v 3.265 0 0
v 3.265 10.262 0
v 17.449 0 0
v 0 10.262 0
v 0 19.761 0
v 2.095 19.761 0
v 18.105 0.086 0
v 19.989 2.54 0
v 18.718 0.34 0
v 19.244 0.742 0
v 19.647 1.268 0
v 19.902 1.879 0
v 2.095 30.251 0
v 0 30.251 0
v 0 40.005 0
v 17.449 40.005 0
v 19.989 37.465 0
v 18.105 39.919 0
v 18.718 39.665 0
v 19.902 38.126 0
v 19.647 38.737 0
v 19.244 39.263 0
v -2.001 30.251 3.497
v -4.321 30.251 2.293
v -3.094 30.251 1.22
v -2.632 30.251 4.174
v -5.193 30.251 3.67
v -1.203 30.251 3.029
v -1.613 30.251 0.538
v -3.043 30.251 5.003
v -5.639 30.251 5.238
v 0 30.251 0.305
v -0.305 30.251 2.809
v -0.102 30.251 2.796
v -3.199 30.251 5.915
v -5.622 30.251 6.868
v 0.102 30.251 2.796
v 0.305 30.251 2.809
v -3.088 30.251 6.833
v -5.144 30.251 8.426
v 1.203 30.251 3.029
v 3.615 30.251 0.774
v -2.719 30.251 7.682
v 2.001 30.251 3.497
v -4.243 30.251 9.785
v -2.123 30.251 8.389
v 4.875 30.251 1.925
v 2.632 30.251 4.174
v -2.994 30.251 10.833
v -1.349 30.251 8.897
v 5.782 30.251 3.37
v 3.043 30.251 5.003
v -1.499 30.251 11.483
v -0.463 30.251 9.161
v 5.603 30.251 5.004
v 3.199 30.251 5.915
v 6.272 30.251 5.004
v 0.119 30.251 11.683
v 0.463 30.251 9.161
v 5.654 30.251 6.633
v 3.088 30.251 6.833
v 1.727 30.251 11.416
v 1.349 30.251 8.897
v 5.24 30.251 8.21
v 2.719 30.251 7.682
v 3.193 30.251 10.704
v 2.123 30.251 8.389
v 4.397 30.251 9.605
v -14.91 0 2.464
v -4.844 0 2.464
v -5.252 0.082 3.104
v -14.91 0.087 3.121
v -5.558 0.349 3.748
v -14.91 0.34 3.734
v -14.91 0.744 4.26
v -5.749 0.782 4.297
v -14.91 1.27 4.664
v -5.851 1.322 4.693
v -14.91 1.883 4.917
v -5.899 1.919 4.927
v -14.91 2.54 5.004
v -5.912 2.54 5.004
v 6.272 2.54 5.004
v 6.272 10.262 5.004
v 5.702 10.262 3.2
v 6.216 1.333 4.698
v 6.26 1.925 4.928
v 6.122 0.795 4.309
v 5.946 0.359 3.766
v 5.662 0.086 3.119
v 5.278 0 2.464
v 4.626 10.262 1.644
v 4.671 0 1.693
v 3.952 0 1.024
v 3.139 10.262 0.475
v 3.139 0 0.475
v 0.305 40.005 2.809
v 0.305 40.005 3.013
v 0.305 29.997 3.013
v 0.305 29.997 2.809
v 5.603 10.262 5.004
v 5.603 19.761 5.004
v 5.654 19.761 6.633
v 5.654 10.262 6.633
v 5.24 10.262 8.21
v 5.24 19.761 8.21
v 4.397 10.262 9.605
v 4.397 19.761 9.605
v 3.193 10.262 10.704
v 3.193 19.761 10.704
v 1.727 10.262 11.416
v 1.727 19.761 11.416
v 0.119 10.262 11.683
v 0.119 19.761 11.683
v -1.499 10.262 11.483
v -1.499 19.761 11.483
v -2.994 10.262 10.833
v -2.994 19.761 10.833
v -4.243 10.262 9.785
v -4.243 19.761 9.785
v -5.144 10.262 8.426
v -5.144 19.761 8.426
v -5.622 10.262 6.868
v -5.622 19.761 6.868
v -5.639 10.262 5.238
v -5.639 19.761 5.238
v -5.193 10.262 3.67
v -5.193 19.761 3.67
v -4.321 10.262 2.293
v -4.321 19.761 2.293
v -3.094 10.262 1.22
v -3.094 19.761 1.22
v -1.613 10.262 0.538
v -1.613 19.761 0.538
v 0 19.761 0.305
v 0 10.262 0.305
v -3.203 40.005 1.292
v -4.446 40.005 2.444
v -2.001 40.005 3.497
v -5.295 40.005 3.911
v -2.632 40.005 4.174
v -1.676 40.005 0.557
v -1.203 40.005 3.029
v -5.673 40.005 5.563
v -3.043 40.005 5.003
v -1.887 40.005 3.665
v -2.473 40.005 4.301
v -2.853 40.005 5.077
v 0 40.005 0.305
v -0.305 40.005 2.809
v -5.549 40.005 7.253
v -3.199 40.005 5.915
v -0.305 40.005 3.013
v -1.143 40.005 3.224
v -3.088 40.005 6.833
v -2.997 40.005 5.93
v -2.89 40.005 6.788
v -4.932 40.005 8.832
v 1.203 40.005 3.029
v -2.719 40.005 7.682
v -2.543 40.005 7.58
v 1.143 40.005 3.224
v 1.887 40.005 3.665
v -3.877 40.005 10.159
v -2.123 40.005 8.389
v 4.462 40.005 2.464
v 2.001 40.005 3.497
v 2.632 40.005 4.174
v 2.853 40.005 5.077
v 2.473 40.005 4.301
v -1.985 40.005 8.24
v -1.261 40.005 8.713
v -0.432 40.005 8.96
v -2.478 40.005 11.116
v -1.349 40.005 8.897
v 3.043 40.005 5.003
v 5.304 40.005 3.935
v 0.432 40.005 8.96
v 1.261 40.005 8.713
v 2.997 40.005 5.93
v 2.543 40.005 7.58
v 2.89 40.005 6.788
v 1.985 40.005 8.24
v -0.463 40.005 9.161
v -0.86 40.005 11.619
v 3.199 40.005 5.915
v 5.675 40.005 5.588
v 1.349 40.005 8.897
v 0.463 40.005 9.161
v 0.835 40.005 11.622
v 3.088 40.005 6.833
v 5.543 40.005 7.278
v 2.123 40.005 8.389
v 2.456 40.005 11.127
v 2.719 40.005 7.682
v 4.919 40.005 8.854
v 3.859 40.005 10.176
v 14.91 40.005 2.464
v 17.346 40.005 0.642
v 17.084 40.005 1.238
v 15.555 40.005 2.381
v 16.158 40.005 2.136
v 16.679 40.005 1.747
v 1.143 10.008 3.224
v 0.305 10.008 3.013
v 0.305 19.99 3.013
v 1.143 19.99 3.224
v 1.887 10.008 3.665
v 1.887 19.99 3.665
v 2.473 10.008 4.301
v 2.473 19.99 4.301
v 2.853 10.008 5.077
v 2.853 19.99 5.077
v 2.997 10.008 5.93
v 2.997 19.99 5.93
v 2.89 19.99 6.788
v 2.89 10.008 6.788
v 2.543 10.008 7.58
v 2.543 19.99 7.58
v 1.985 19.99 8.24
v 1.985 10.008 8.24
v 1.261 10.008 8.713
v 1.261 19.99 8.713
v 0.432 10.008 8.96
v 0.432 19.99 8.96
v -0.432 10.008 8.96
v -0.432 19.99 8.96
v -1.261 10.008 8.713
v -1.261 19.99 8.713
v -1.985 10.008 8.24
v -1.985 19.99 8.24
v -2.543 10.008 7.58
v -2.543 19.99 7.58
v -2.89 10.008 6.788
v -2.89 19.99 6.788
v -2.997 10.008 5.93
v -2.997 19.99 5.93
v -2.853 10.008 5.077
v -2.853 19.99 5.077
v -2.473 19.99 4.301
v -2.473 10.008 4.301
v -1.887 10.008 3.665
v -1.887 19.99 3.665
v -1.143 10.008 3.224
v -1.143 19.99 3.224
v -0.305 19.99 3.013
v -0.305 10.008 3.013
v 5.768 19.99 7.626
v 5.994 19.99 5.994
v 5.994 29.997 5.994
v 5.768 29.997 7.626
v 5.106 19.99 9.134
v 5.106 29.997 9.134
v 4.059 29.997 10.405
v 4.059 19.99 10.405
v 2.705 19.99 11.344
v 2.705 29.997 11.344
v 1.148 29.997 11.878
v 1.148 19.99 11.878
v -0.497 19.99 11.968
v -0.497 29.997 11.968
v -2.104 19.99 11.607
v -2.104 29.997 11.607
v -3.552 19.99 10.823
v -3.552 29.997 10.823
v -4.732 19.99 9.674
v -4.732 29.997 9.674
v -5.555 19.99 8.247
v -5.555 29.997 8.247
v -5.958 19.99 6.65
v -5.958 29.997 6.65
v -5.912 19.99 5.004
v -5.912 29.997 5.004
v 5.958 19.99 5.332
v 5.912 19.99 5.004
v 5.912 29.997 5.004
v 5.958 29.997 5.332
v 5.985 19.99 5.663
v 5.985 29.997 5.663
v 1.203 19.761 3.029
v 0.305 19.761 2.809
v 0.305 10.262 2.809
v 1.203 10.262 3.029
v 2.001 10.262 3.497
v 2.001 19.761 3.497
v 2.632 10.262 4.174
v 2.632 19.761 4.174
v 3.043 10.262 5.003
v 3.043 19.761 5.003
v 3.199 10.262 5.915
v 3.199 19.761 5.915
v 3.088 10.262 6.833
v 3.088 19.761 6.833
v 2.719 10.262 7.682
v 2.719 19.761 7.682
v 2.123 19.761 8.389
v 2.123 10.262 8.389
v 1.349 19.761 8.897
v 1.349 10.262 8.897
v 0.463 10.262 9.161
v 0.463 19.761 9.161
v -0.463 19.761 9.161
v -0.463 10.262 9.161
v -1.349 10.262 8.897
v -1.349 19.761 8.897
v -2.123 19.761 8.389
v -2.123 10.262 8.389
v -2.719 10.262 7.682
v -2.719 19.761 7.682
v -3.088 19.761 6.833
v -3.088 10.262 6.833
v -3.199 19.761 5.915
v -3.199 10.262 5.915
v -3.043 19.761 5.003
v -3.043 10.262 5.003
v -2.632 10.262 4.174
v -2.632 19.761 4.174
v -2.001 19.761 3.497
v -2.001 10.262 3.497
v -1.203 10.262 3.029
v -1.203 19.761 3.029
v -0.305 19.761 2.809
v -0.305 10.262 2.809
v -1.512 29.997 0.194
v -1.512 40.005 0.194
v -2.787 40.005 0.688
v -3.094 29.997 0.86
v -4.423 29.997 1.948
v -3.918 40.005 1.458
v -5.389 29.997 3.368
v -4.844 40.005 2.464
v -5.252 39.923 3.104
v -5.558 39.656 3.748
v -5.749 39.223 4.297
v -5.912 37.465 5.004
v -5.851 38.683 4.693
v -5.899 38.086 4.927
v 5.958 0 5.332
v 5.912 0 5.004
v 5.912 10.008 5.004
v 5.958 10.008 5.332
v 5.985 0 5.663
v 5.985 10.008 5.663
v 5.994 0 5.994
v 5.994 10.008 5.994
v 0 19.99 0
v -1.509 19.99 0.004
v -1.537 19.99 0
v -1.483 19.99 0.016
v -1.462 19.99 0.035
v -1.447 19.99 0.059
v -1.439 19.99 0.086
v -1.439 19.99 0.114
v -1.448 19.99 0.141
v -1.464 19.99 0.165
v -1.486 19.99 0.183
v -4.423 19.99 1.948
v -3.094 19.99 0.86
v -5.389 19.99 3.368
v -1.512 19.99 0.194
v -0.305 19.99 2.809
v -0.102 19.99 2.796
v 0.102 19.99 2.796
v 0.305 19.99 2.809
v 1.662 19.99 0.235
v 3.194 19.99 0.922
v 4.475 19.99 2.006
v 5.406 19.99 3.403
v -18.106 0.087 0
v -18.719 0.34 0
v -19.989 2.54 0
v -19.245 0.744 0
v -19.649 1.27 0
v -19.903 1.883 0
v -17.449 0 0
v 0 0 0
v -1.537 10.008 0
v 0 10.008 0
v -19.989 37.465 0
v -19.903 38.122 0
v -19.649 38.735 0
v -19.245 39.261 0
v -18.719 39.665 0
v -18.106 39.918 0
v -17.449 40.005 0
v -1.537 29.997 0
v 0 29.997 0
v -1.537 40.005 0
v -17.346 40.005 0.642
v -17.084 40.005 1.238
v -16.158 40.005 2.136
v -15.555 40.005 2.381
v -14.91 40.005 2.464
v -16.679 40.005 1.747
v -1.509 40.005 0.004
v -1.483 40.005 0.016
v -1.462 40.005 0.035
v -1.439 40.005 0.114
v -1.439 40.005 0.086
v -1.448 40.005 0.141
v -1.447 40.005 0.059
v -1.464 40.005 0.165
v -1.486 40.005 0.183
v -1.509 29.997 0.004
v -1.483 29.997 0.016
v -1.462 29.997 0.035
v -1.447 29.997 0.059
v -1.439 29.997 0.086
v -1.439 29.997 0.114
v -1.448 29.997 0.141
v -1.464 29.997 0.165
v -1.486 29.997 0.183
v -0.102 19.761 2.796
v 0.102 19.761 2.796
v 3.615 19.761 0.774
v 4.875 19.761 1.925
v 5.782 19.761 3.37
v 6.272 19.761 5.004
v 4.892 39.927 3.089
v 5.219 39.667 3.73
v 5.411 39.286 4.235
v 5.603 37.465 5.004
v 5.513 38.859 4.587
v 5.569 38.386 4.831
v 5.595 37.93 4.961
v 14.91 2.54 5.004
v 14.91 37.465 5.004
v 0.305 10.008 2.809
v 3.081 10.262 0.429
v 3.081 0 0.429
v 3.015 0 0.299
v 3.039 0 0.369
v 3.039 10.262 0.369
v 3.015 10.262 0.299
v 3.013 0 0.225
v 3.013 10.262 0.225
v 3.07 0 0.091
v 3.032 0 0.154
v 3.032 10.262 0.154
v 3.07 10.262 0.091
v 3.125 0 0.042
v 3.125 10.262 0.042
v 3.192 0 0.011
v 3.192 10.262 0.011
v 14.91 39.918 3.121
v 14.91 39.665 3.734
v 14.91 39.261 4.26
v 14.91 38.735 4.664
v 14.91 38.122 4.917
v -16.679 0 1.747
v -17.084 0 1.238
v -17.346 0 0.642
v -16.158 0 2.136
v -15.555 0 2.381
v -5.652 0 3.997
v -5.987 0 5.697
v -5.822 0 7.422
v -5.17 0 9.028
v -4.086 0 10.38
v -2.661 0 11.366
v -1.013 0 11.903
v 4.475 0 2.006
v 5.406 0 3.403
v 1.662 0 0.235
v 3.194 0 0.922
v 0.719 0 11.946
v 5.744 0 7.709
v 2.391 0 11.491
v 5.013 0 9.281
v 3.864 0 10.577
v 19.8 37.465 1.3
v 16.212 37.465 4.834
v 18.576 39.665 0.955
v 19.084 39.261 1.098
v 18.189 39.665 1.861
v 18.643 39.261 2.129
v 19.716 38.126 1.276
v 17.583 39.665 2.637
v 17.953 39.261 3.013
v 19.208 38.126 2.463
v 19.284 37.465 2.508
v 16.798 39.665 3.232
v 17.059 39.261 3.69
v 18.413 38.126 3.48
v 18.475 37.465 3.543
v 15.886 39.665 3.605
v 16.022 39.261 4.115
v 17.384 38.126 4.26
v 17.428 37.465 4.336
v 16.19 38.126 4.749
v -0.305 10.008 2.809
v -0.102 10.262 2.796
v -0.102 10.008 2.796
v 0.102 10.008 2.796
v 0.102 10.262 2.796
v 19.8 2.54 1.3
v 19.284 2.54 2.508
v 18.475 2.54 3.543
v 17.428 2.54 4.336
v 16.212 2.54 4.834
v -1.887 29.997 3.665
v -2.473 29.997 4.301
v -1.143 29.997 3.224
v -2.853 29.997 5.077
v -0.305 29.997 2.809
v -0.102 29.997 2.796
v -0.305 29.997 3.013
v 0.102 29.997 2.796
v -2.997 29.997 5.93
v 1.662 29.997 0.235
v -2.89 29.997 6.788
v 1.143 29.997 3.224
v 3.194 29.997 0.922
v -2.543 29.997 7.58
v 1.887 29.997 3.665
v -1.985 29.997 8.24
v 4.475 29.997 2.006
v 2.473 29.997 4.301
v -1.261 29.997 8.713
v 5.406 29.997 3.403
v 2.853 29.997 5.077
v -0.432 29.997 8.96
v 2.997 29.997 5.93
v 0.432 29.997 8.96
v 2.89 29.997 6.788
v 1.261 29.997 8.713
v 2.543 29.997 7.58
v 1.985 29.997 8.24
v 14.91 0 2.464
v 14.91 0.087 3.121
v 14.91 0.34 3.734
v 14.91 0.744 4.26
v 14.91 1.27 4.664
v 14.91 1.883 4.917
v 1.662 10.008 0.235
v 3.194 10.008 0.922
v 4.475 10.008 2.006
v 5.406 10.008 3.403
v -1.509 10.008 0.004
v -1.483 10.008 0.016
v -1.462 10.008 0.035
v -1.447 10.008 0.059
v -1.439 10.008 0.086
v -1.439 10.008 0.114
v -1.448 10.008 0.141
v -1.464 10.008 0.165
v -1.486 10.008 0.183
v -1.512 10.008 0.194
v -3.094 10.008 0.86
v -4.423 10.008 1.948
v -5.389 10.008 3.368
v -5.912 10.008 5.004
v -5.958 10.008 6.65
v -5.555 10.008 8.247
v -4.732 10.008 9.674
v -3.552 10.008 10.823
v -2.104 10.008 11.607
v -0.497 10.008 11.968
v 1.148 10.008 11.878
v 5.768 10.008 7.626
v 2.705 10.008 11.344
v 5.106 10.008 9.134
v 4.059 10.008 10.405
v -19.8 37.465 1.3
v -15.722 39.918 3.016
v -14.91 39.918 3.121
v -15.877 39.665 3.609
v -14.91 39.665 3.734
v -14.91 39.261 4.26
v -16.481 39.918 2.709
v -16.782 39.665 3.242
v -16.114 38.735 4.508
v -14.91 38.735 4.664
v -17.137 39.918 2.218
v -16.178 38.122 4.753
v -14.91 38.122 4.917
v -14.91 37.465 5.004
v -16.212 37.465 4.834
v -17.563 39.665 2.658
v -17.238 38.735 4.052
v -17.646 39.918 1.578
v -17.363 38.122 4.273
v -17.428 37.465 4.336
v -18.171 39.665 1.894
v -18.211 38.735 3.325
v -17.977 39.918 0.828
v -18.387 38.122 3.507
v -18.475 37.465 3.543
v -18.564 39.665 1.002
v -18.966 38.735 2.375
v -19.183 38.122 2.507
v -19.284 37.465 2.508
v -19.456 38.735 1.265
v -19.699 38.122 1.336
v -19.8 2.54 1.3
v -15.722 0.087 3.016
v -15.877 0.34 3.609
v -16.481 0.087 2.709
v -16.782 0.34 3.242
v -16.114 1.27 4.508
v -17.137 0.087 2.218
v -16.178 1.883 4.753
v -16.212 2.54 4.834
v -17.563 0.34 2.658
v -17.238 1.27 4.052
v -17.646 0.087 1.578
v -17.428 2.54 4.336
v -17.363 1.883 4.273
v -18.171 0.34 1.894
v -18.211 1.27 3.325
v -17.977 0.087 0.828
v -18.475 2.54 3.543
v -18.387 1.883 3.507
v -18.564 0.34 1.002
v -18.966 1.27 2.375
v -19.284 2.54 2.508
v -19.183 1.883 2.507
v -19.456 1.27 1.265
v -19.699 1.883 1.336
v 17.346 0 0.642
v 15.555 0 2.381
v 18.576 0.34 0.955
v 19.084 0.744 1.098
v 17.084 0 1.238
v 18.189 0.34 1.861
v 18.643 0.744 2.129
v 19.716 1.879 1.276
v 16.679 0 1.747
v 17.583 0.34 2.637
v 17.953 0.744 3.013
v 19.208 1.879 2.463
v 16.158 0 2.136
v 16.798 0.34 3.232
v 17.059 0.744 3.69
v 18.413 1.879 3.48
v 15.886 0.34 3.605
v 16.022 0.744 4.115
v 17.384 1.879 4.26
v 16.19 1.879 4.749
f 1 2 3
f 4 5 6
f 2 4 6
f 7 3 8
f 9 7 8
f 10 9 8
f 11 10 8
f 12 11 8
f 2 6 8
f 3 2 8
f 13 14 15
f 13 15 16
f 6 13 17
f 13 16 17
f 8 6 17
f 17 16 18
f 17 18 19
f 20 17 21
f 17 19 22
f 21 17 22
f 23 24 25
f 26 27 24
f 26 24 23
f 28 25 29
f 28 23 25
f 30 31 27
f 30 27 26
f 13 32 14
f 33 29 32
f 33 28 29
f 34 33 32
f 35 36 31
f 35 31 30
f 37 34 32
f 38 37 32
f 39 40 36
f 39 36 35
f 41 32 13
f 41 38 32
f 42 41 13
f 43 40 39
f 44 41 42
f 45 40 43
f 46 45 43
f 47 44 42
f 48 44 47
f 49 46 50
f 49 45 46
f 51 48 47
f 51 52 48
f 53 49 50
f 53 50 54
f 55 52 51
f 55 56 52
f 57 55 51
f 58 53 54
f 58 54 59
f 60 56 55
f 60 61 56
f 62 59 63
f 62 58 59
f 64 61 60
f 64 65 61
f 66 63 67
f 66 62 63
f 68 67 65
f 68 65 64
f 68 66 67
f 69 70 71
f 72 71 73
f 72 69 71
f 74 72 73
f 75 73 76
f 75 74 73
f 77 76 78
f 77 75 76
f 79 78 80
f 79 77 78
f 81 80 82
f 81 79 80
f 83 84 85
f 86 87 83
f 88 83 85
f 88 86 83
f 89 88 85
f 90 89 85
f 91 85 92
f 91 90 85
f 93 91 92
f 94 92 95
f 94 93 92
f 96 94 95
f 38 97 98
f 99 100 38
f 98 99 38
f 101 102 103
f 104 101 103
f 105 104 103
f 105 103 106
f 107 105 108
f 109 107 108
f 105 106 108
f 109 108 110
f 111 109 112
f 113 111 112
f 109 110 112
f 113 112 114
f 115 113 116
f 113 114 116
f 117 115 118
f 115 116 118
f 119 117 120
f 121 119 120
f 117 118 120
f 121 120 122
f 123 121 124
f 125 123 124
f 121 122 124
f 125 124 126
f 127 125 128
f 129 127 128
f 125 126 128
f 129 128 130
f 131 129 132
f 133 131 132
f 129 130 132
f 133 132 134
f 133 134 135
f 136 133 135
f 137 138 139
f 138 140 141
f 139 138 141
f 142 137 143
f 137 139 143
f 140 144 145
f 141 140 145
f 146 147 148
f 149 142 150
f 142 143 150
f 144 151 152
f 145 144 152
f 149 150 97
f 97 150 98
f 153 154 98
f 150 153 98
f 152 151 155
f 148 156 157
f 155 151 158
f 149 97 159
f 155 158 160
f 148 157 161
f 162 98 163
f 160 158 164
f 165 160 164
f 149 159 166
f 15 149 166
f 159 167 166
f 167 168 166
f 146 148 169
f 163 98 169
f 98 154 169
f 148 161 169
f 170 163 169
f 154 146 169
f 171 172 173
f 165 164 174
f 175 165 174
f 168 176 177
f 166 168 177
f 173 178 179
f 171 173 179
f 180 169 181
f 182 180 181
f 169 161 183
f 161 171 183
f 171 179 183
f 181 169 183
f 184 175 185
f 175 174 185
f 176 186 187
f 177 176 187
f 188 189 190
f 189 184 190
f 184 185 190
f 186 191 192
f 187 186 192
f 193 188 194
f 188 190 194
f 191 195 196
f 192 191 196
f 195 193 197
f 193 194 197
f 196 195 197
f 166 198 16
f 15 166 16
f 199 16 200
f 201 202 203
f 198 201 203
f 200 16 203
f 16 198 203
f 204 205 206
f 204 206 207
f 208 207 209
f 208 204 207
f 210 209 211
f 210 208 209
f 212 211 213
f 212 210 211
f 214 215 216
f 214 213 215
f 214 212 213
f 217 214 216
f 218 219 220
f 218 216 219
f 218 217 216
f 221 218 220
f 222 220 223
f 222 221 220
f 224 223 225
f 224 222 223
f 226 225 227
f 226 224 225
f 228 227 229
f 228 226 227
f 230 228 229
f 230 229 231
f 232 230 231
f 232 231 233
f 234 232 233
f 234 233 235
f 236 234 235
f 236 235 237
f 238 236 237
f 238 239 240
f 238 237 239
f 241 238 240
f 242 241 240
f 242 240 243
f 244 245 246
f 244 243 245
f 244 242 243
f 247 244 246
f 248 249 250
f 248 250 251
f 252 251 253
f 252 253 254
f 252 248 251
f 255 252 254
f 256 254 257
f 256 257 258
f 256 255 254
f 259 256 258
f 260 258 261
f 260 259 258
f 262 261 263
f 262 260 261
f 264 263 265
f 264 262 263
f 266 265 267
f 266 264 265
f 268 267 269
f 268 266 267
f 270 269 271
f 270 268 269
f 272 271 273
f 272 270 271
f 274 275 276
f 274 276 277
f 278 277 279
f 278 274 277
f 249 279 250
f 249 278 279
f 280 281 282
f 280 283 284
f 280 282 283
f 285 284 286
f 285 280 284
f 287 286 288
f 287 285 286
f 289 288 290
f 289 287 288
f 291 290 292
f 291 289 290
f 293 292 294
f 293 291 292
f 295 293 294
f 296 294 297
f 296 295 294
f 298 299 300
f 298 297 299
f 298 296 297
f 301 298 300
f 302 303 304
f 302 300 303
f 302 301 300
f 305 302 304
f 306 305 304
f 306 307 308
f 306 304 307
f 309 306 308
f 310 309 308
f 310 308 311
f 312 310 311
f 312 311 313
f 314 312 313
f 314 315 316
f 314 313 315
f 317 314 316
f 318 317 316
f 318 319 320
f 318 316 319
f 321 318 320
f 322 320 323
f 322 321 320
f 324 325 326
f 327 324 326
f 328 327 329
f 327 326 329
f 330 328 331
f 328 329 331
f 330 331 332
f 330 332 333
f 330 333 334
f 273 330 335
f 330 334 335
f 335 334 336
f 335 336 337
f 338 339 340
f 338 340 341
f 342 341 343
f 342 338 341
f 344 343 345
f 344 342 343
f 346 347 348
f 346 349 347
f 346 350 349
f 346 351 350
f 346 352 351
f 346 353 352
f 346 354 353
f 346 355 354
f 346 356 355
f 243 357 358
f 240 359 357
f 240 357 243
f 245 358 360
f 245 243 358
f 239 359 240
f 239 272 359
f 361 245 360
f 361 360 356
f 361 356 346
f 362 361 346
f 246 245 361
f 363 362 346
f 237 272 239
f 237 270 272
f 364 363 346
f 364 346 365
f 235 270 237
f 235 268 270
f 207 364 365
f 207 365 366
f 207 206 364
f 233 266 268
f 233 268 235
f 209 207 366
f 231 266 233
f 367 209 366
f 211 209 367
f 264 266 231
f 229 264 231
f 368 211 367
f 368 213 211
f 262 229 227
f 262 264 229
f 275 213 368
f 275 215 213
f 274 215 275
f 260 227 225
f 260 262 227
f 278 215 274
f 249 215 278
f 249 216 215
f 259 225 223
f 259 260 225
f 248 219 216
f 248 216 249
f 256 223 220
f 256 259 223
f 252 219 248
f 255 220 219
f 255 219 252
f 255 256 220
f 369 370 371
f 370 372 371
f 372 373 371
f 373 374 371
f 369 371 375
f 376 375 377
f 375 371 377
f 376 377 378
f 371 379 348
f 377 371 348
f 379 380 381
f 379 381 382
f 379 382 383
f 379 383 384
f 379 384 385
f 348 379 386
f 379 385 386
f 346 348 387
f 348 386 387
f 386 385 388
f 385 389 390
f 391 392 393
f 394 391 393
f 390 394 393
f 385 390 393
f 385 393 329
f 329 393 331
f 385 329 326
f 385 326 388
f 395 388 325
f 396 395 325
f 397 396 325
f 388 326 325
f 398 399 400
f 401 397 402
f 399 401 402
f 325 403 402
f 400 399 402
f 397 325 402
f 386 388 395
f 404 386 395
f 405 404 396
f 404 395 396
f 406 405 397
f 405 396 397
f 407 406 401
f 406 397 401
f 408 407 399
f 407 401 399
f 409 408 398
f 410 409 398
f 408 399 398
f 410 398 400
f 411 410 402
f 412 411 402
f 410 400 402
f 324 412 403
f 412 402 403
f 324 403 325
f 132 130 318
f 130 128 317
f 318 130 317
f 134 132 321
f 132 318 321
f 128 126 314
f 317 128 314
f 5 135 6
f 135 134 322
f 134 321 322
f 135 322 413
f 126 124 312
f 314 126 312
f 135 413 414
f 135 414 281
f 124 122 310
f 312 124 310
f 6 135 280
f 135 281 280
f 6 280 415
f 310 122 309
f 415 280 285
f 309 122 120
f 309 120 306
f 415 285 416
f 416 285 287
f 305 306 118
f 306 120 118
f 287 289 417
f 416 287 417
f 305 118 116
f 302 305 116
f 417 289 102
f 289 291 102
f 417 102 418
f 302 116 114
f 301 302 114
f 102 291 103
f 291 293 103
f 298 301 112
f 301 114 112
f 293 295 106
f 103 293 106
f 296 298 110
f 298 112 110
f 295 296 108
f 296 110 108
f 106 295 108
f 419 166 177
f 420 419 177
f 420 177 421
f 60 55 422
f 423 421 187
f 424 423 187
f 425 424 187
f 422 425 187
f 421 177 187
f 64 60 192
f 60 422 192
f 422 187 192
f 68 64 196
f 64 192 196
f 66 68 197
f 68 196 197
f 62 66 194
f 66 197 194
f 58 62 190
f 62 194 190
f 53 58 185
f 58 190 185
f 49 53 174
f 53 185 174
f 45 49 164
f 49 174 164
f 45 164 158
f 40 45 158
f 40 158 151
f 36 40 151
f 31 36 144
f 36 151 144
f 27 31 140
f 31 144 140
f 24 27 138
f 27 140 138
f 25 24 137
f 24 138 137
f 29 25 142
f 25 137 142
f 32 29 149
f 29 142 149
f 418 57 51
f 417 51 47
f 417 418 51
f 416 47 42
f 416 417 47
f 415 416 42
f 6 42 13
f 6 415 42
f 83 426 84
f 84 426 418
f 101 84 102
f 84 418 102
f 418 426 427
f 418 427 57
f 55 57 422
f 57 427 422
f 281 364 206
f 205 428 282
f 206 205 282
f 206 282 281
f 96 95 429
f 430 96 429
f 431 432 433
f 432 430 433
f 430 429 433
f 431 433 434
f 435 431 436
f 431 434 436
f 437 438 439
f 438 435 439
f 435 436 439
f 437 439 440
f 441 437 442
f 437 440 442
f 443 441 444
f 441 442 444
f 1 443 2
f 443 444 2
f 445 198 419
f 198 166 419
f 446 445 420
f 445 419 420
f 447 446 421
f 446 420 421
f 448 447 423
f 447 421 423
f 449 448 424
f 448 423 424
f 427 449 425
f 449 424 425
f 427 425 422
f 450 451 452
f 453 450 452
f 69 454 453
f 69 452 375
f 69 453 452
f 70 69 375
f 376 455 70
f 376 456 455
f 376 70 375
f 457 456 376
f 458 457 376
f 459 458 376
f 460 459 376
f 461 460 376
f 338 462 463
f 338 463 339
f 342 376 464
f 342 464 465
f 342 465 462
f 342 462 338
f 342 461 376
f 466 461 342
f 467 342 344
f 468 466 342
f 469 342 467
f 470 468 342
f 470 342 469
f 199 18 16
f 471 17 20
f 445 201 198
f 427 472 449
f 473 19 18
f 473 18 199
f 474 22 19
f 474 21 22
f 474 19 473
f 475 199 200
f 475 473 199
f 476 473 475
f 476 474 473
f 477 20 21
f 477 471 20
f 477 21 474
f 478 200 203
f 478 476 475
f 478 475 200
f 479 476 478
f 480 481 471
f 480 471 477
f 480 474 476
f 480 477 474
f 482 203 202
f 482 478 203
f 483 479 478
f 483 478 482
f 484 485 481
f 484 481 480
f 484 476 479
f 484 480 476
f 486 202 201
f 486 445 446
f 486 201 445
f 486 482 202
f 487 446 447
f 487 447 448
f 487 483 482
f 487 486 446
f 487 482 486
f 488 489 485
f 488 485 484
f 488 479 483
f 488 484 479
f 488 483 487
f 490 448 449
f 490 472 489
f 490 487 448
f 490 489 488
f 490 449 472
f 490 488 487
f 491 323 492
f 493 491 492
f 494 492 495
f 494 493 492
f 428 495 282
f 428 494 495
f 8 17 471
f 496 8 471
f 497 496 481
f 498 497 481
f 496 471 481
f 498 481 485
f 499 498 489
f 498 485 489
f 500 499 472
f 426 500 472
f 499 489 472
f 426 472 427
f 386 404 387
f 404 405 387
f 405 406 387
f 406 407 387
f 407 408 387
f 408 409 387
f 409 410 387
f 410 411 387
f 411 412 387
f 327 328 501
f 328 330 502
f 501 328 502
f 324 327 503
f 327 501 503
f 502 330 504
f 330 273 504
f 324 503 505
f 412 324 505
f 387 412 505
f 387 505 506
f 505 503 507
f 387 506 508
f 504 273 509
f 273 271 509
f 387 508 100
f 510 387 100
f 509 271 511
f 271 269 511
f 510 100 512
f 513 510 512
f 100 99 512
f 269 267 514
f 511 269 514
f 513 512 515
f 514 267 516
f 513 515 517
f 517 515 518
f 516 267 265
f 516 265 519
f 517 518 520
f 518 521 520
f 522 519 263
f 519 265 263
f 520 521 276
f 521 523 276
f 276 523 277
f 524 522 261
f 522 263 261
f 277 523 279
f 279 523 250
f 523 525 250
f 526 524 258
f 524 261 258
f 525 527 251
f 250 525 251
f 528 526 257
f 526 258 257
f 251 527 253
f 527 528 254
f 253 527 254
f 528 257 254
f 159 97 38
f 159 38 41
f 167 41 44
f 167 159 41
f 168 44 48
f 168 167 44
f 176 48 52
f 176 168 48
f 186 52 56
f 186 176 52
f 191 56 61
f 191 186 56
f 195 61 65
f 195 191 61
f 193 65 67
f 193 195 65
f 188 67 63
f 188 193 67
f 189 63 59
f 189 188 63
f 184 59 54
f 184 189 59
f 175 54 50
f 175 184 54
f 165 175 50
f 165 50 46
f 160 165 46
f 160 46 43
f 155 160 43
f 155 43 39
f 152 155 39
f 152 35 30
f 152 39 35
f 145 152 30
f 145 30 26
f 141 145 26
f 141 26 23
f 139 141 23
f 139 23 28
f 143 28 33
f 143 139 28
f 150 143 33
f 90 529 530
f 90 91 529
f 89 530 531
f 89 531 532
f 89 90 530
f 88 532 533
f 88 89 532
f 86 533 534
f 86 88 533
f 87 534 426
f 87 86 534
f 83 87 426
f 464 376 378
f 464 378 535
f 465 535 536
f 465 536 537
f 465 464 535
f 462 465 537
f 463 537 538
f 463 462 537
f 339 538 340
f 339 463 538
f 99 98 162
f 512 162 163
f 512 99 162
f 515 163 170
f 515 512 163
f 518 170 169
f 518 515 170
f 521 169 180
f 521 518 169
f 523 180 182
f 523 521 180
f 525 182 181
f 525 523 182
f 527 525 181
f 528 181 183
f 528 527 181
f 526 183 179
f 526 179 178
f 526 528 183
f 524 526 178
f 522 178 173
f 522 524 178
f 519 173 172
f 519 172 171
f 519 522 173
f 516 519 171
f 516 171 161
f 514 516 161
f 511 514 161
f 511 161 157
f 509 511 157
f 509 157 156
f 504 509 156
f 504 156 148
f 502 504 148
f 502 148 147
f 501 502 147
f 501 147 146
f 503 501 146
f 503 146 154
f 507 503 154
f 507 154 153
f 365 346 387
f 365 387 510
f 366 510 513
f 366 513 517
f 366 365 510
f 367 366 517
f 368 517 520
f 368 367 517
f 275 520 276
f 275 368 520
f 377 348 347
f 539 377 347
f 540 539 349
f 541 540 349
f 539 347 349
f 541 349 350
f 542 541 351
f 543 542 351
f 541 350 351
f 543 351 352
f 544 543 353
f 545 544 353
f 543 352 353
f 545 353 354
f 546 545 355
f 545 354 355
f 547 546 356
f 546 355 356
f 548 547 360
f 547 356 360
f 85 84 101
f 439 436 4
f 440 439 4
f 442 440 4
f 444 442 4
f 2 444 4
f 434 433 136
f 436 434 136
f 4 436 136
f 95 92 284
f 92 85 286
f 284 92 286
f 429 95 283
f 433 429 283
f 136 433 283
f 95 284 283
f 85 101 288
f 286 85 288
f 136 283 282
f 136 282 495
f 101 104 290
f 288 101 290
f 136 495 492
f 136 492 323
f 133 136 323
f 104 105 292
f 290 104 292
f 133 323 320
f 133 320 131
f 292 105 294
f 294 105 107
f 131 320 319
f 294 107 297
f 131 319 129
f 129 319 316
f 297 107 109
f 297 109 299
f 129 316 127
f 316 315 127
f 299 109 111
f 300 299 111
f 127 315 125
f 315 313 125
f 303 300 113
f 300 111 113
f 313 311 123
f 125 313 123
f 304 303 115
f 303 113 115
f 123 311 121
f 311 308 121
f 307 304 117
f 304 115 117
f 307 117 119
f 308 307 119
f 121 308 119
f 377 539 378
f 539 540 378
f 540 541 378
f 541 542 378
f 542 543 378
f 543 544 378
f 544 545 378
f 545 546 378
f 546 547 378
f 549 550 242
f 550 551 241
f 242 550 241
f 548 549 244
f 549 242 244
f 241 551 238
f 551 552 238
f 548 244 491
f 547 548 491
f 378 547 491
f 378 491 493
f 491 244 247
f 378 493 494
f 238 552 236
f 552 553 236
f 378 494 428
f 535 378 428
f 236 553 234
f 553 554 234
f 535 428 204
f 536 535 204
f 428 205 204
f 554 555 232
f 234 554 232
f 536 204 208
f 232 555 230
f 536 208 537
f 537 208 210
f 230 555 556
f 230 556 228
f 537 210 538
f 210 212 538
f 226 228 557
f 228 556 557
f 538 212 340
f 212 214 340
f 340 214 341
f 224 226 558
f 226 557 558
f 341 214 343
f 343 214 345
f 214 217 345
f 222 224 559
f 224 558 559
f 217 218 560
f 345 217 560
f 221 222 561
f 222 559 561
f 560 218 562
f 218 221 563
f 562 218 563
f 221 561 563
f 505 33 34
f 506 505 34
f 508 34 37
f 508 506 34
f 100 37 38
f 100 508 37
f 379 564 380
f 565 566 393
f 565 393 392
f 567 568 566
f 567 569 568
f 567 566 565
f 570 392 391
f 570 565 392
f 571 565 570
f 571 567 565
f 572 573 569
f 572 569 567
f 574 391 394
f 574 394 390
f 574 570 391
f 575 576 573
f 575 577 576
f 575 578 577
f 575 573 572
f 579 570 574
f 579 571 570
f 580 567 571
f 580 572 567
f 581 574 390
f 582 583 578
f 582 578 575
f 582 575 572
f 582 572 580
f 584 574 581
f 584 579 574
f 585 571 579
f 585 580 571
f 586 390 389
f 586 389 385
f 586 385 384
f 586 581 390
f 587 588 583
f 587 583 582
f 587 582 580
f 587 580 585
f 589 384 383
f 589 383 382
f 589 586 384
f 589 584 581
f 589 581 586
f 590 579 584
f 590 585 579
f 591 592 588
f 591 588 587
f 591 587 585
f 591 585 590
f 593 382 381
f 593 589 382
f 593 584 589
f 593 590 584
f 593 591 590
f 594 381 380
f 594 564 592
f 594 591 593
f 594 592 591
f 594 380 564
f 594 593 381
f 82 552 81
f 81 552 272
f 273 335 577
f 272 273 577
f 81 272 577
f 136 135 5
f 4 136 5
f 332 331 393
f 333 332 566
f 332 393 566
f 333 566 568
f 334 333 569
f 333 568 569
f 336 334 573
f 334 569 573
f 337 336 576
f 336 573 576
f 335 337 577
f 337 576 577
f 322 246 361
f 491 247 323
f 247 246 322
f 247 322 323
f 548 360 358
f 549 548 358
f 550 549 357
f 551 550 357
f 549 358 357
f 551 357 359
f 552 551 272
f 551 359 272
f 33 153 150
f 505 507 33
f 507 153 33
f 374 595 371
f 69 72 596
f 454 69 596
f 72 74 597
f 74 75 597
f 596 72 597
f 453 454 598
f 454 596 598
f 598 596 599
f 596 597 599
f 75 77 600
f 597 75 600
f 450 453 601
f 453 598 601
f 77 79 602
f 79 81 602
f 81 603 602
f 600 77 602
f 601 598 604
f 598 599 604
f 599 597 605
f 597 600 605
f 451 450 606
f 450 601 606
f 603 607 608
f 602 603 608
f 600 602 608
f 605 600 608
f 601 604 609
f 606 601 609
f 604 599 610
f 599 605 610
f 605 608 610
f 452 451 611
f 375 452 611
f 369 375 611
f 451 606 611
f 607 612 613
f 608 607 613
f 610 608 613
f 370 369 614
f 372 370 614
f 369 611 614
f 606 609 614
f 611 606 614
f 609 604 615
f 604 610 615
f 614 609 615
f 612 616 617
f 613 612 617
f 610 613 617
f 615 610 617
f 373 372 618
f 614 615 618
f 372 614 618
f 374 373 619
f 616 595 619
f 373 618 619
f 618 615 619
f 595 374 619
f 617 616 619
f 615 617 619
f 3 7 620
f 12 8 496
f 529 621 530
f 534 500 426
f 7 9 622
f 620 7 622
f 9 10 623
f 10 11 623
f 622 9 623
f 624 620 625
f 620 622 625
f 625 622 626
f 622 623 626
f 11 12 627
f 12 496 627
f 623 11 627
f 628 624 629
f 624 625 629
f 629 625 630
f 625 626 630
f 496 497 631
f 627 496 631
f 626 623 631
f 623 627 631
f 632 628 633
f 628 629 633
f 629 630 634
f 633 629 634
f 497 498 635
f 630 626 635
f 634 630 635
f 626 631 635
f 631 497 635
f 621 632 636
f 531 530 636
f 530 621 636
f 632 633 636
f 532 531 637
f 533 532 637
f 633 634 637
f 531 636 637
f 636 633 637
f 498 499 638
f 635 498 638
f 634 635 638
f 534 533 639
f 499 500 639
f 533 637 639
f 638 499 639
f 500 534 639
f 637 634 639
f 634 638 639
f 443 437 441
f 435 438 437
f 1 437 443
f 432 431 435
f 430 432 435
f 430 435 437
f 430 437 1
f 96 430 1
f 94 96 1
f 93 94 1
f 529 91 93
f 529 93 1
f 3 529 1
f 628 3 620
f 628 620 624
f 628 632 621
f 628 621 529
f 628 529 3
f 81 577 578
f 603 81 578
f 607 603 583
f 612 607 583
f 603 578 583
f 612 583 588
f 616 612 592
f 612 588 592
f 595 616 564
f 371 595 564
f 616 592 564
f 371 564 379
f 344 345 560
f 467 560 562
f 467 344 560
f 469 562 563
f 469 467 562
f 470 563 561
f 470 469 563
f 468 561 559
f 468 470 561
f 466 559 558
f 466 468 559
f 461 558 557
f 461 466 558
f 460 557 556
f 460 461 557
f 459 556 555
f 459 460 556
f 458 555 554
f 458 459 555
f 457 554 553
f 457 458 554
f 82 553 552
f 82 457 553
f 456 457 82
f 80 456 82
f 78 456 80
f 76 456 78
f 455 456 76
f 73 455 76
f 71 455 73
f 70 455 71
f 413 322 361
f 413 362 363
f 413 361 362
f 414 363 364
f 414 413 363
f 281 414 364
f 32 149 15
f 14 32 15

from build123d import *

# Parameters (mm, degrees)
F3_DEPTH     = 10.0076
F4_DEPTH     = 40.005
F6_START     = -19.9898
F6_DEPTH     = 10.0076
F7_DEPTH     = 10.0076
F9_START     = 20.2438
F2_R         = 3.2004
F9_DEPTH     = 9.4996
F10_DEPTH    = 10.2616
F11_START    = 20.0152
F11_DEPTH    = 9.9822
F12_START    = -19.7612
F12_DEPTH    = 11.6078
F13_DEPTH    = 9.7536
F14_T1_DEPTH = 13.1863686745
F15_T1_DEPTH = 65.405
F16_R        = 2.54


# Not quite as in the source:
# - a fillet or chamfer that OpenCascade refuses, or shapes differently, is made with other operations: its cross-section is extruded or revolved along the edge and cut away or added


with BuildPart() as f3:
    # F0 (on Front) → F3 (new body)
    with BuildSketch(Plane.XZ):
        with BuildLine():
            ThreePointArc((-5.9119830007, 5.0038), (-3.8726462994, 1.4188735822), (0, 0))
            ThreePointArc((0, 0), (3.8726462994, 1.4188735822), (5.9119830007, 5.0038))
            ThreePointArc((5.9119830007, 5.0038), (5.9737602169, 5.4973887019), (5.9944, 5.9944))
            ThreePointArc((5.9944, 5.9944), (-0.4970112981, 11.9681602169), (-5.9119830007, 5.0038))
        make_face()
        with BuildLine():
            ThreePointArc((-0.3048, 3.0127385839), (0, 8.9916), (0.3048, 3.0127385839))
            Line((0.3048, 3.0127385839), (0.3048, 2.808547348))
            ThreePointArc((0.3048, 2.808547348), (0, 2.794), (-0.3048, 2.808547348))
            Line((-0.3048, 2.808547348), (-0.3048, 3.0127385839))
        make_face(mode=Mode.SUBTRACT)
        with BuildLine():
            Line((-19.9898, 0), (0, 0))
            ThreePointArc((0, 0), (-3.8726462994, 1.4188735822), (-5.9119830007, 5.0038))
            Line((-5.9119830007, 5.0038), (-19.9898, 5.0038))
            Line((-19.9898, 5.0038), (-19.9898, 0))
        make_face()
    extrude(amount=-F3_DEPTH)

    # F0 (on Front) → F4 (join)
    with BuildSketch(Plane.XZ):
        with BuildLine():
            Line((0.3048, 2.808547348), (0.3048, 3.0127385839))
            ThreePointArc((0.3048, 3.0127385839), (0, 8.9916), (-0.3048, 3.0127385839))
            Line((-0.3048, 3.0127385839), (-0.3048, 2.808547348))
            ThreePointArc((-0.3048, 2.808547348), (0, 2.794), (0.3048, 2.808547348))
        make_face()
    extrude(amount=-F4_DEPTH)

    # F0 (on Front) → F6 (join)
    with BuildSketch(Plane.XZ.offset(F6_START)):
        with BuildLine():
            ThreePointArc((-5.9119830007, 5.0038), (-3.8726462994, 1.4188735822), (0, 0))
            ThreePointArc((0, 0), (3.8726462994, 1.4188735822), (5.9119830007, 5.0038))
            ThreePointArc((5.9119830007, 5.0038), (5.9737602169, 5.4973887019), (5.9944, 5.9944))
            ThreePointArc((5.9944, 5.9944), (-0.4970112981, 11.9681602169), (-5.9119830007, 5.0038))
        make_face()
        with BuildLine():
            ThreePointArc((-0.3048, 3.0127385839), (0, 8.9916), (0.3048, 3.0127385839))
            Line((0.3048, 3.0127385839), (0.3048, 2.808547348))
            ThreePointArc((0.3048, 2.808547348), (0, 2.794), (-0.3048, 2.808547348))
            Line((-0.3048, 2.808547348), (-0.3048, 3.0127385839))
        make_face(mode=Mode.SUBTRACT)
        with BuildLine():
            Line((-19.9898, 0), (0, 0))
            ThreePointArc((0, 0), (-3.8726462994, 1.4188735822), (-5.9119830007, 5.0038))
            Line((-5.9119830007, 5.0038), (-19.9898, 5.0038))
            Line((-19.9898, 5.0038), (-19.9898, 0))
        make_face()
    extrude(amount=-F6_DEPTH)

    # F2 (on offset) → F7 (join)
    with BuildSketch(Plane.XZ.offset(-40.005)):
        with BuildLine():
            ThreePointArc((-1.5118372742, 0.1937811178), (-4.4229342387, 1.9483545134), (-5.9119830007, 5.0038))
            Line((-5.9119830007, 5.0038), (-19.9898, 5.0038))
            Line((-19.9898, 5.0038), (-19.9898, 0))
            Line((-19.9898, 0), (-1.5366753453, 0))
            ThreePointArc((-1.5366753453, 0), (-1.4389921182, 0.0859617436), (-1.5118372742, 0.1937811178))
        make_face()
    extrude(amount=F7_DEPTH)

    # F2 (on offset) → F9 (join)
    with BuildSketch(Plane.XZ.offset(-40.005).offset(F9_START)):
        with BuildLine():
            Line((0, 0.3048), (0, 0))
            ThreePointArc((0, 0), (3.8726462994, 1.4188735822), (5.9119830007, 5.0038))
            Line((5.9119830007, 5.0038), (5.6027011164, 5.0038))
            ThreePointArc((5.6027011164, 5.0038), (-3.6561886166, 10.353738592), (0, 0.3048))
        make_face()
        with Locations((0, 5.9944)):
            Circle(F2_R, mode=Mode.SUBTRACT)
        with BuildLine():
            ThreePointArc((5.9119830007, 5.0038), (3.8726462994, 1.4188735822), (0, 0))
            Line((0, 0), (19.9898, 0))
            Line((19.9898, 0), (19.9898, 5.0038))
            Line((19.9898, 5.0038), (5.9119830007, 5.0038))
        make_face()
    extrude(amount=F9_DEPTH)

    # F0 (on Front) → F10 (join)
    with BuildSketch(Plane.XZ):
        with BuildLine():
            ThreePointArc((6.2722573002, 5.0038), (4.8747199854, 1.9250505355), (2.0951536077, 0))
            Line((2.0951536077, 0), (19.9898, 0))
            Line((19.9898, 0), (19.9898, 5.0038))
            Line((19.9898, 5.0038), (6.2722573002, 5.0038))
        make_face()
    extrude(amount=-F10_DEPTH)

    # F2 (on offset) → F11 (join)
    with BuildSketch(Plane.XZ.offset(-40.005).offset(F11_START)):
        with BuildLine():
            ThreePointArc((-1.5118372742, 0.1937811178), (-4.4229342387, 1.9483545134), (-5.9119830007, 5.0038))
            Line((-5.9119830007, 5.0038), (-19.9898, 5.0038))
            Line((-19.9898, 5.0038), (-19.9898, 0))
            Line((-19.9898, 0), (-1.5366753453, 0))
            ThreePointArc((-1.5366753453, 0), (-1.4389921182, 0.0859617436), (-1.5118372742, 0.1937811178))
        make_face()
    extrude(amount=F11_DEPTH)

    # F0 (on Front) → F12 (join)
    with BuildSketch(Plane.XZ.offset(F12_START)):
        with BuildLine():
            ThreePointArc((6.2722573002, 5.0038), (4.8747199854, 1.9250505355), (2.0951536077, 0))
            Line((2.0951536077, 0), (19.9898, 0))
            Line((19.9898, 0), (19.9898, 5.0038))
            Line((19.9898, 5.0038), (6.2722573002, 5.0038))
        make_face()
    extrude(amount=-F12_DEPTH)

    # F2 (on offset) → F13 (join)
    with BuildSketch(Plane.XZ.offset(-40.005)):
        with BuildLine():
            ThreePointArc((5.9119830007, 5.0038), (3.8726462994, 1.4188735822), (0, 0))
            Line((0, 0), (19.9898, 0))
            Line((19.9898, 0), (19.9898, 5.0038))
            Line((19.9898, 5.0038), (5.9119830007, 5.0038))
        make_face()
        with BuildLine():
            Line((0, 0.3048), (0, 0))
            ThreePointArc((0, 0), (3.8726462994, 1.4188735822), (5.9119830007, 5.0038))
            Line((5.9119830007, 5.0038), (5.6027011164, 5.0038))
            ThreePointArc((5.6027011164, 5.0038), (-3.6561886166, 10.353738592), (0, 0.3048))
        make_face()
        with Locations((0, 5.9944)):
            Circle(F2_R, mode=Mode.SUBTRACT)
    extrude(amount=F13_DEPTH)

    # F14: fillet of radius 0.254 on 1 edges, made by hand

    # F14_s2 → F14_t1 (cut)
    with BuildSketch(Plane.XZ.offset(-10.2616)):
        with BuildLine():
            ThreePointArc((3.1394818053, 0.4747846154), (3.0195052872, 0.1890511444), (3.2650610775, 0))
            Line((3.2650610775, 0), (2.0951536077, 0))
            ThreePointArc((2.0951536077, 0), (2.628061469, 0.2137605098), (3.1394818053, 0.4747846154))
        make_face()
    extrude(amount=F14_T1_DEPTH, mode=Mode.SUBTRACT)

    # F15: fillet of radius 5.08 on 2 edges, made by hand

    # F15_s2 → F15_t1 (cut)
    with BuildSketch(Plane.XZ.offset(-52.705)):
        with BuildLine():
            ThreePointArc((-14.9098, 5.0038), (-18.5019024484, 3.5159024484), (-19.9898, -0.0762))
            Line((-19.9898, -0.0762), (-19.9898, 5.0038))
            Line((-19.9898, 5.0038), (-14.9098, 5.0038))
        make_face()
        with BuildLine():
            ThreePointArc((19.9898, -0.0762), (18.5019024484, 3.5159024484), (14.9098, 5.0038))
            Line((14.9098, 5.0038), (19.9898, 5.0038))
            Line((19.9898, 5.0038), (19.9898, -0.0762))
        make_face()
    extrude(amount=F15_T1_DEPTH, mode=Mode.SUBTRACT)

    # F16
    f16_edges = [f3.edges().sort_by_distance(p)[0] for p in [
        (10.256251, 40.005, 5.0038),
        (-10.410892, 40.005, 5.0038),
        (-10.410892, 0, 5.0038),
        (10.591029, 0, 5.0038),
        (-18.47486, 0, 3.542743),
        (-18.47486, 40.005, 3.542743),
        (18.47486, 40.005, 3.542743),
        (18.47486, 0, 3.542743),
    ]]
    fillet(f16_edges, radius=F16_R)


solid = f3.part
